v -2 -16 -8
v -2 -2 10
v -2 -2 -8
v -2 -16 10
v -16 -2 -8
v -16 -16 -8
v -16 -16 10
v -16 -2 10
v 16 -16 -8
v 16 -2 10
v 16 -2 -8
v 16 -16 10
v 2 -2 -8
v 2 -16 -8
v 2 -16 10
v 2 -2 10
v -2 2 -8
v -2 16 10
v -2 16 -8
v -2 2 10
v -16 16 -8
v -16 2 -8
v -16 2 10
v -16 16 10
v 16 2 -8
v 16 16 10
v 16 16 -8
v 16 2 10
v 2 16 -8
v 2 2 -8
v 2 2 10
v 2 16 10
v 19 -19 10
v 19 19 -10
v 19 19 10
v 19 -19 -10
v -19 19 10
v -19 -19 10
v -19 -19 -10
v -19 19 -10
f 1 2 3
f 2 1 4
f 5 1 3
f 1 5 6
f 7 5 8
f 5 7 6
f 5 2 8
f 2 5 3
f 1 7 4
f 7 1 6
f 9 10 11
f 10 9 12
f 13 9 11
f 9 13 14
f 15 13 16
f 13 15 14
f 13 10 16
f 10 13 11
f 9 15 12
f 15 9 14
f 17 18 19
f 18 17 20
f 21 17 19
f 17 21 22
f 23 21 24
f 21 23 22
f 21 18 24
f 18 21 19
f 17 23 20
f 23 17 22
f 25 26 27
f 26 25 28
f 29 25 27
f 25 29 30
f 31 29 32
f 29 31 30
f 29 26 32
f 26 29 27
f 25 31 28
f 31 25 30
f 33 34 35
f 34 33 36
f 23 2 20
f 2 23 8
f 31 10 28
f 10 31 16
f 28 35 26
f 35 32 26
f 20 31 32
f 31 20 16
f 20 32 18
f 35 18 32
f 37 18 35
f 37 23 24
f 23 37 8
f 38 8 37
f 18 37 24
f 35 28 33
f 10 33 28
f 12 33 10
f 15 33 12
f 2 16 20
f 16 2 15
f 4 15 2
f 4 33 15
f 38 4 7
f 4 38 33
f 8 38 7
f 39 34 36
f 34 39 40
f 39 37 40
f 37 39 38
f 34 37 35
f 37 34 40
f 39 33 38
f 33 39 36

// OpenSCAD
$fn = 32;

// ----------------------------------------------------------------------
// Pocket plate 38 x 38 x 20
// 2 x 2 pockets 14 mm square, 18 mm deep
// ----------------------------------------------------------------------

// --- parameters (mm) ---
thickness = 20;  // plate thickness
floor_t = 2;     // material left under each pocket
pocket = 14;     // pocket side length
pitch_x = 18;    // pocket pitch along X
pitch_y = 18;    // pocket pitch along Y
cols = 2;        // pockets per row
rows = 2;        // rows of pockets

// --- derived feature positions (mm) ---
depth = thickness - floor_t;        // = 18   pocket depth, down to the floor
span_x = (cols - 1) * pitch_x;      // = 18   distance between outer pockets
span_y = (rows - 1) * pitch_y;      // = 18   distance between outer pocket rows
origin_x = -span_x / 2;             // = -9   X of the first pocket
origin_y = -span_y / 2;             // = -9   Y of the first pocket
plate = [span_x + pocket + 6, span_y + pocket + 6, thickness];  // = [38, 38, 20]   overall size: pockets plus 3 mm of wall on each side
feature_centers = [
  [origin_x + 0 * pitch_x, origin_y + 0 * pitch_y],
  [origin_x + 1 * pitch_x, origin_y + 0 * pitch_y],
  [origin_x + 0 * pitch_x, origin_y + 1 * pitch_y],
  [origin_x + 1 * pitch_x, origin_y + 1 * pitch_y]
];   // pocket centres, used verbatim by the cutter loop

// plate outline, then one pocket per centre in feature_centers
difference() {
  cube(plate, center = true);
  for (centre = feature_centers)
    translate([centre[0] - pocket / 2, centre[1] - pocket / 2, plate[2] / 2 - depth])
      cube([pocket, pocket, depth + 1]);  // centred on the declared pocket centre
}
